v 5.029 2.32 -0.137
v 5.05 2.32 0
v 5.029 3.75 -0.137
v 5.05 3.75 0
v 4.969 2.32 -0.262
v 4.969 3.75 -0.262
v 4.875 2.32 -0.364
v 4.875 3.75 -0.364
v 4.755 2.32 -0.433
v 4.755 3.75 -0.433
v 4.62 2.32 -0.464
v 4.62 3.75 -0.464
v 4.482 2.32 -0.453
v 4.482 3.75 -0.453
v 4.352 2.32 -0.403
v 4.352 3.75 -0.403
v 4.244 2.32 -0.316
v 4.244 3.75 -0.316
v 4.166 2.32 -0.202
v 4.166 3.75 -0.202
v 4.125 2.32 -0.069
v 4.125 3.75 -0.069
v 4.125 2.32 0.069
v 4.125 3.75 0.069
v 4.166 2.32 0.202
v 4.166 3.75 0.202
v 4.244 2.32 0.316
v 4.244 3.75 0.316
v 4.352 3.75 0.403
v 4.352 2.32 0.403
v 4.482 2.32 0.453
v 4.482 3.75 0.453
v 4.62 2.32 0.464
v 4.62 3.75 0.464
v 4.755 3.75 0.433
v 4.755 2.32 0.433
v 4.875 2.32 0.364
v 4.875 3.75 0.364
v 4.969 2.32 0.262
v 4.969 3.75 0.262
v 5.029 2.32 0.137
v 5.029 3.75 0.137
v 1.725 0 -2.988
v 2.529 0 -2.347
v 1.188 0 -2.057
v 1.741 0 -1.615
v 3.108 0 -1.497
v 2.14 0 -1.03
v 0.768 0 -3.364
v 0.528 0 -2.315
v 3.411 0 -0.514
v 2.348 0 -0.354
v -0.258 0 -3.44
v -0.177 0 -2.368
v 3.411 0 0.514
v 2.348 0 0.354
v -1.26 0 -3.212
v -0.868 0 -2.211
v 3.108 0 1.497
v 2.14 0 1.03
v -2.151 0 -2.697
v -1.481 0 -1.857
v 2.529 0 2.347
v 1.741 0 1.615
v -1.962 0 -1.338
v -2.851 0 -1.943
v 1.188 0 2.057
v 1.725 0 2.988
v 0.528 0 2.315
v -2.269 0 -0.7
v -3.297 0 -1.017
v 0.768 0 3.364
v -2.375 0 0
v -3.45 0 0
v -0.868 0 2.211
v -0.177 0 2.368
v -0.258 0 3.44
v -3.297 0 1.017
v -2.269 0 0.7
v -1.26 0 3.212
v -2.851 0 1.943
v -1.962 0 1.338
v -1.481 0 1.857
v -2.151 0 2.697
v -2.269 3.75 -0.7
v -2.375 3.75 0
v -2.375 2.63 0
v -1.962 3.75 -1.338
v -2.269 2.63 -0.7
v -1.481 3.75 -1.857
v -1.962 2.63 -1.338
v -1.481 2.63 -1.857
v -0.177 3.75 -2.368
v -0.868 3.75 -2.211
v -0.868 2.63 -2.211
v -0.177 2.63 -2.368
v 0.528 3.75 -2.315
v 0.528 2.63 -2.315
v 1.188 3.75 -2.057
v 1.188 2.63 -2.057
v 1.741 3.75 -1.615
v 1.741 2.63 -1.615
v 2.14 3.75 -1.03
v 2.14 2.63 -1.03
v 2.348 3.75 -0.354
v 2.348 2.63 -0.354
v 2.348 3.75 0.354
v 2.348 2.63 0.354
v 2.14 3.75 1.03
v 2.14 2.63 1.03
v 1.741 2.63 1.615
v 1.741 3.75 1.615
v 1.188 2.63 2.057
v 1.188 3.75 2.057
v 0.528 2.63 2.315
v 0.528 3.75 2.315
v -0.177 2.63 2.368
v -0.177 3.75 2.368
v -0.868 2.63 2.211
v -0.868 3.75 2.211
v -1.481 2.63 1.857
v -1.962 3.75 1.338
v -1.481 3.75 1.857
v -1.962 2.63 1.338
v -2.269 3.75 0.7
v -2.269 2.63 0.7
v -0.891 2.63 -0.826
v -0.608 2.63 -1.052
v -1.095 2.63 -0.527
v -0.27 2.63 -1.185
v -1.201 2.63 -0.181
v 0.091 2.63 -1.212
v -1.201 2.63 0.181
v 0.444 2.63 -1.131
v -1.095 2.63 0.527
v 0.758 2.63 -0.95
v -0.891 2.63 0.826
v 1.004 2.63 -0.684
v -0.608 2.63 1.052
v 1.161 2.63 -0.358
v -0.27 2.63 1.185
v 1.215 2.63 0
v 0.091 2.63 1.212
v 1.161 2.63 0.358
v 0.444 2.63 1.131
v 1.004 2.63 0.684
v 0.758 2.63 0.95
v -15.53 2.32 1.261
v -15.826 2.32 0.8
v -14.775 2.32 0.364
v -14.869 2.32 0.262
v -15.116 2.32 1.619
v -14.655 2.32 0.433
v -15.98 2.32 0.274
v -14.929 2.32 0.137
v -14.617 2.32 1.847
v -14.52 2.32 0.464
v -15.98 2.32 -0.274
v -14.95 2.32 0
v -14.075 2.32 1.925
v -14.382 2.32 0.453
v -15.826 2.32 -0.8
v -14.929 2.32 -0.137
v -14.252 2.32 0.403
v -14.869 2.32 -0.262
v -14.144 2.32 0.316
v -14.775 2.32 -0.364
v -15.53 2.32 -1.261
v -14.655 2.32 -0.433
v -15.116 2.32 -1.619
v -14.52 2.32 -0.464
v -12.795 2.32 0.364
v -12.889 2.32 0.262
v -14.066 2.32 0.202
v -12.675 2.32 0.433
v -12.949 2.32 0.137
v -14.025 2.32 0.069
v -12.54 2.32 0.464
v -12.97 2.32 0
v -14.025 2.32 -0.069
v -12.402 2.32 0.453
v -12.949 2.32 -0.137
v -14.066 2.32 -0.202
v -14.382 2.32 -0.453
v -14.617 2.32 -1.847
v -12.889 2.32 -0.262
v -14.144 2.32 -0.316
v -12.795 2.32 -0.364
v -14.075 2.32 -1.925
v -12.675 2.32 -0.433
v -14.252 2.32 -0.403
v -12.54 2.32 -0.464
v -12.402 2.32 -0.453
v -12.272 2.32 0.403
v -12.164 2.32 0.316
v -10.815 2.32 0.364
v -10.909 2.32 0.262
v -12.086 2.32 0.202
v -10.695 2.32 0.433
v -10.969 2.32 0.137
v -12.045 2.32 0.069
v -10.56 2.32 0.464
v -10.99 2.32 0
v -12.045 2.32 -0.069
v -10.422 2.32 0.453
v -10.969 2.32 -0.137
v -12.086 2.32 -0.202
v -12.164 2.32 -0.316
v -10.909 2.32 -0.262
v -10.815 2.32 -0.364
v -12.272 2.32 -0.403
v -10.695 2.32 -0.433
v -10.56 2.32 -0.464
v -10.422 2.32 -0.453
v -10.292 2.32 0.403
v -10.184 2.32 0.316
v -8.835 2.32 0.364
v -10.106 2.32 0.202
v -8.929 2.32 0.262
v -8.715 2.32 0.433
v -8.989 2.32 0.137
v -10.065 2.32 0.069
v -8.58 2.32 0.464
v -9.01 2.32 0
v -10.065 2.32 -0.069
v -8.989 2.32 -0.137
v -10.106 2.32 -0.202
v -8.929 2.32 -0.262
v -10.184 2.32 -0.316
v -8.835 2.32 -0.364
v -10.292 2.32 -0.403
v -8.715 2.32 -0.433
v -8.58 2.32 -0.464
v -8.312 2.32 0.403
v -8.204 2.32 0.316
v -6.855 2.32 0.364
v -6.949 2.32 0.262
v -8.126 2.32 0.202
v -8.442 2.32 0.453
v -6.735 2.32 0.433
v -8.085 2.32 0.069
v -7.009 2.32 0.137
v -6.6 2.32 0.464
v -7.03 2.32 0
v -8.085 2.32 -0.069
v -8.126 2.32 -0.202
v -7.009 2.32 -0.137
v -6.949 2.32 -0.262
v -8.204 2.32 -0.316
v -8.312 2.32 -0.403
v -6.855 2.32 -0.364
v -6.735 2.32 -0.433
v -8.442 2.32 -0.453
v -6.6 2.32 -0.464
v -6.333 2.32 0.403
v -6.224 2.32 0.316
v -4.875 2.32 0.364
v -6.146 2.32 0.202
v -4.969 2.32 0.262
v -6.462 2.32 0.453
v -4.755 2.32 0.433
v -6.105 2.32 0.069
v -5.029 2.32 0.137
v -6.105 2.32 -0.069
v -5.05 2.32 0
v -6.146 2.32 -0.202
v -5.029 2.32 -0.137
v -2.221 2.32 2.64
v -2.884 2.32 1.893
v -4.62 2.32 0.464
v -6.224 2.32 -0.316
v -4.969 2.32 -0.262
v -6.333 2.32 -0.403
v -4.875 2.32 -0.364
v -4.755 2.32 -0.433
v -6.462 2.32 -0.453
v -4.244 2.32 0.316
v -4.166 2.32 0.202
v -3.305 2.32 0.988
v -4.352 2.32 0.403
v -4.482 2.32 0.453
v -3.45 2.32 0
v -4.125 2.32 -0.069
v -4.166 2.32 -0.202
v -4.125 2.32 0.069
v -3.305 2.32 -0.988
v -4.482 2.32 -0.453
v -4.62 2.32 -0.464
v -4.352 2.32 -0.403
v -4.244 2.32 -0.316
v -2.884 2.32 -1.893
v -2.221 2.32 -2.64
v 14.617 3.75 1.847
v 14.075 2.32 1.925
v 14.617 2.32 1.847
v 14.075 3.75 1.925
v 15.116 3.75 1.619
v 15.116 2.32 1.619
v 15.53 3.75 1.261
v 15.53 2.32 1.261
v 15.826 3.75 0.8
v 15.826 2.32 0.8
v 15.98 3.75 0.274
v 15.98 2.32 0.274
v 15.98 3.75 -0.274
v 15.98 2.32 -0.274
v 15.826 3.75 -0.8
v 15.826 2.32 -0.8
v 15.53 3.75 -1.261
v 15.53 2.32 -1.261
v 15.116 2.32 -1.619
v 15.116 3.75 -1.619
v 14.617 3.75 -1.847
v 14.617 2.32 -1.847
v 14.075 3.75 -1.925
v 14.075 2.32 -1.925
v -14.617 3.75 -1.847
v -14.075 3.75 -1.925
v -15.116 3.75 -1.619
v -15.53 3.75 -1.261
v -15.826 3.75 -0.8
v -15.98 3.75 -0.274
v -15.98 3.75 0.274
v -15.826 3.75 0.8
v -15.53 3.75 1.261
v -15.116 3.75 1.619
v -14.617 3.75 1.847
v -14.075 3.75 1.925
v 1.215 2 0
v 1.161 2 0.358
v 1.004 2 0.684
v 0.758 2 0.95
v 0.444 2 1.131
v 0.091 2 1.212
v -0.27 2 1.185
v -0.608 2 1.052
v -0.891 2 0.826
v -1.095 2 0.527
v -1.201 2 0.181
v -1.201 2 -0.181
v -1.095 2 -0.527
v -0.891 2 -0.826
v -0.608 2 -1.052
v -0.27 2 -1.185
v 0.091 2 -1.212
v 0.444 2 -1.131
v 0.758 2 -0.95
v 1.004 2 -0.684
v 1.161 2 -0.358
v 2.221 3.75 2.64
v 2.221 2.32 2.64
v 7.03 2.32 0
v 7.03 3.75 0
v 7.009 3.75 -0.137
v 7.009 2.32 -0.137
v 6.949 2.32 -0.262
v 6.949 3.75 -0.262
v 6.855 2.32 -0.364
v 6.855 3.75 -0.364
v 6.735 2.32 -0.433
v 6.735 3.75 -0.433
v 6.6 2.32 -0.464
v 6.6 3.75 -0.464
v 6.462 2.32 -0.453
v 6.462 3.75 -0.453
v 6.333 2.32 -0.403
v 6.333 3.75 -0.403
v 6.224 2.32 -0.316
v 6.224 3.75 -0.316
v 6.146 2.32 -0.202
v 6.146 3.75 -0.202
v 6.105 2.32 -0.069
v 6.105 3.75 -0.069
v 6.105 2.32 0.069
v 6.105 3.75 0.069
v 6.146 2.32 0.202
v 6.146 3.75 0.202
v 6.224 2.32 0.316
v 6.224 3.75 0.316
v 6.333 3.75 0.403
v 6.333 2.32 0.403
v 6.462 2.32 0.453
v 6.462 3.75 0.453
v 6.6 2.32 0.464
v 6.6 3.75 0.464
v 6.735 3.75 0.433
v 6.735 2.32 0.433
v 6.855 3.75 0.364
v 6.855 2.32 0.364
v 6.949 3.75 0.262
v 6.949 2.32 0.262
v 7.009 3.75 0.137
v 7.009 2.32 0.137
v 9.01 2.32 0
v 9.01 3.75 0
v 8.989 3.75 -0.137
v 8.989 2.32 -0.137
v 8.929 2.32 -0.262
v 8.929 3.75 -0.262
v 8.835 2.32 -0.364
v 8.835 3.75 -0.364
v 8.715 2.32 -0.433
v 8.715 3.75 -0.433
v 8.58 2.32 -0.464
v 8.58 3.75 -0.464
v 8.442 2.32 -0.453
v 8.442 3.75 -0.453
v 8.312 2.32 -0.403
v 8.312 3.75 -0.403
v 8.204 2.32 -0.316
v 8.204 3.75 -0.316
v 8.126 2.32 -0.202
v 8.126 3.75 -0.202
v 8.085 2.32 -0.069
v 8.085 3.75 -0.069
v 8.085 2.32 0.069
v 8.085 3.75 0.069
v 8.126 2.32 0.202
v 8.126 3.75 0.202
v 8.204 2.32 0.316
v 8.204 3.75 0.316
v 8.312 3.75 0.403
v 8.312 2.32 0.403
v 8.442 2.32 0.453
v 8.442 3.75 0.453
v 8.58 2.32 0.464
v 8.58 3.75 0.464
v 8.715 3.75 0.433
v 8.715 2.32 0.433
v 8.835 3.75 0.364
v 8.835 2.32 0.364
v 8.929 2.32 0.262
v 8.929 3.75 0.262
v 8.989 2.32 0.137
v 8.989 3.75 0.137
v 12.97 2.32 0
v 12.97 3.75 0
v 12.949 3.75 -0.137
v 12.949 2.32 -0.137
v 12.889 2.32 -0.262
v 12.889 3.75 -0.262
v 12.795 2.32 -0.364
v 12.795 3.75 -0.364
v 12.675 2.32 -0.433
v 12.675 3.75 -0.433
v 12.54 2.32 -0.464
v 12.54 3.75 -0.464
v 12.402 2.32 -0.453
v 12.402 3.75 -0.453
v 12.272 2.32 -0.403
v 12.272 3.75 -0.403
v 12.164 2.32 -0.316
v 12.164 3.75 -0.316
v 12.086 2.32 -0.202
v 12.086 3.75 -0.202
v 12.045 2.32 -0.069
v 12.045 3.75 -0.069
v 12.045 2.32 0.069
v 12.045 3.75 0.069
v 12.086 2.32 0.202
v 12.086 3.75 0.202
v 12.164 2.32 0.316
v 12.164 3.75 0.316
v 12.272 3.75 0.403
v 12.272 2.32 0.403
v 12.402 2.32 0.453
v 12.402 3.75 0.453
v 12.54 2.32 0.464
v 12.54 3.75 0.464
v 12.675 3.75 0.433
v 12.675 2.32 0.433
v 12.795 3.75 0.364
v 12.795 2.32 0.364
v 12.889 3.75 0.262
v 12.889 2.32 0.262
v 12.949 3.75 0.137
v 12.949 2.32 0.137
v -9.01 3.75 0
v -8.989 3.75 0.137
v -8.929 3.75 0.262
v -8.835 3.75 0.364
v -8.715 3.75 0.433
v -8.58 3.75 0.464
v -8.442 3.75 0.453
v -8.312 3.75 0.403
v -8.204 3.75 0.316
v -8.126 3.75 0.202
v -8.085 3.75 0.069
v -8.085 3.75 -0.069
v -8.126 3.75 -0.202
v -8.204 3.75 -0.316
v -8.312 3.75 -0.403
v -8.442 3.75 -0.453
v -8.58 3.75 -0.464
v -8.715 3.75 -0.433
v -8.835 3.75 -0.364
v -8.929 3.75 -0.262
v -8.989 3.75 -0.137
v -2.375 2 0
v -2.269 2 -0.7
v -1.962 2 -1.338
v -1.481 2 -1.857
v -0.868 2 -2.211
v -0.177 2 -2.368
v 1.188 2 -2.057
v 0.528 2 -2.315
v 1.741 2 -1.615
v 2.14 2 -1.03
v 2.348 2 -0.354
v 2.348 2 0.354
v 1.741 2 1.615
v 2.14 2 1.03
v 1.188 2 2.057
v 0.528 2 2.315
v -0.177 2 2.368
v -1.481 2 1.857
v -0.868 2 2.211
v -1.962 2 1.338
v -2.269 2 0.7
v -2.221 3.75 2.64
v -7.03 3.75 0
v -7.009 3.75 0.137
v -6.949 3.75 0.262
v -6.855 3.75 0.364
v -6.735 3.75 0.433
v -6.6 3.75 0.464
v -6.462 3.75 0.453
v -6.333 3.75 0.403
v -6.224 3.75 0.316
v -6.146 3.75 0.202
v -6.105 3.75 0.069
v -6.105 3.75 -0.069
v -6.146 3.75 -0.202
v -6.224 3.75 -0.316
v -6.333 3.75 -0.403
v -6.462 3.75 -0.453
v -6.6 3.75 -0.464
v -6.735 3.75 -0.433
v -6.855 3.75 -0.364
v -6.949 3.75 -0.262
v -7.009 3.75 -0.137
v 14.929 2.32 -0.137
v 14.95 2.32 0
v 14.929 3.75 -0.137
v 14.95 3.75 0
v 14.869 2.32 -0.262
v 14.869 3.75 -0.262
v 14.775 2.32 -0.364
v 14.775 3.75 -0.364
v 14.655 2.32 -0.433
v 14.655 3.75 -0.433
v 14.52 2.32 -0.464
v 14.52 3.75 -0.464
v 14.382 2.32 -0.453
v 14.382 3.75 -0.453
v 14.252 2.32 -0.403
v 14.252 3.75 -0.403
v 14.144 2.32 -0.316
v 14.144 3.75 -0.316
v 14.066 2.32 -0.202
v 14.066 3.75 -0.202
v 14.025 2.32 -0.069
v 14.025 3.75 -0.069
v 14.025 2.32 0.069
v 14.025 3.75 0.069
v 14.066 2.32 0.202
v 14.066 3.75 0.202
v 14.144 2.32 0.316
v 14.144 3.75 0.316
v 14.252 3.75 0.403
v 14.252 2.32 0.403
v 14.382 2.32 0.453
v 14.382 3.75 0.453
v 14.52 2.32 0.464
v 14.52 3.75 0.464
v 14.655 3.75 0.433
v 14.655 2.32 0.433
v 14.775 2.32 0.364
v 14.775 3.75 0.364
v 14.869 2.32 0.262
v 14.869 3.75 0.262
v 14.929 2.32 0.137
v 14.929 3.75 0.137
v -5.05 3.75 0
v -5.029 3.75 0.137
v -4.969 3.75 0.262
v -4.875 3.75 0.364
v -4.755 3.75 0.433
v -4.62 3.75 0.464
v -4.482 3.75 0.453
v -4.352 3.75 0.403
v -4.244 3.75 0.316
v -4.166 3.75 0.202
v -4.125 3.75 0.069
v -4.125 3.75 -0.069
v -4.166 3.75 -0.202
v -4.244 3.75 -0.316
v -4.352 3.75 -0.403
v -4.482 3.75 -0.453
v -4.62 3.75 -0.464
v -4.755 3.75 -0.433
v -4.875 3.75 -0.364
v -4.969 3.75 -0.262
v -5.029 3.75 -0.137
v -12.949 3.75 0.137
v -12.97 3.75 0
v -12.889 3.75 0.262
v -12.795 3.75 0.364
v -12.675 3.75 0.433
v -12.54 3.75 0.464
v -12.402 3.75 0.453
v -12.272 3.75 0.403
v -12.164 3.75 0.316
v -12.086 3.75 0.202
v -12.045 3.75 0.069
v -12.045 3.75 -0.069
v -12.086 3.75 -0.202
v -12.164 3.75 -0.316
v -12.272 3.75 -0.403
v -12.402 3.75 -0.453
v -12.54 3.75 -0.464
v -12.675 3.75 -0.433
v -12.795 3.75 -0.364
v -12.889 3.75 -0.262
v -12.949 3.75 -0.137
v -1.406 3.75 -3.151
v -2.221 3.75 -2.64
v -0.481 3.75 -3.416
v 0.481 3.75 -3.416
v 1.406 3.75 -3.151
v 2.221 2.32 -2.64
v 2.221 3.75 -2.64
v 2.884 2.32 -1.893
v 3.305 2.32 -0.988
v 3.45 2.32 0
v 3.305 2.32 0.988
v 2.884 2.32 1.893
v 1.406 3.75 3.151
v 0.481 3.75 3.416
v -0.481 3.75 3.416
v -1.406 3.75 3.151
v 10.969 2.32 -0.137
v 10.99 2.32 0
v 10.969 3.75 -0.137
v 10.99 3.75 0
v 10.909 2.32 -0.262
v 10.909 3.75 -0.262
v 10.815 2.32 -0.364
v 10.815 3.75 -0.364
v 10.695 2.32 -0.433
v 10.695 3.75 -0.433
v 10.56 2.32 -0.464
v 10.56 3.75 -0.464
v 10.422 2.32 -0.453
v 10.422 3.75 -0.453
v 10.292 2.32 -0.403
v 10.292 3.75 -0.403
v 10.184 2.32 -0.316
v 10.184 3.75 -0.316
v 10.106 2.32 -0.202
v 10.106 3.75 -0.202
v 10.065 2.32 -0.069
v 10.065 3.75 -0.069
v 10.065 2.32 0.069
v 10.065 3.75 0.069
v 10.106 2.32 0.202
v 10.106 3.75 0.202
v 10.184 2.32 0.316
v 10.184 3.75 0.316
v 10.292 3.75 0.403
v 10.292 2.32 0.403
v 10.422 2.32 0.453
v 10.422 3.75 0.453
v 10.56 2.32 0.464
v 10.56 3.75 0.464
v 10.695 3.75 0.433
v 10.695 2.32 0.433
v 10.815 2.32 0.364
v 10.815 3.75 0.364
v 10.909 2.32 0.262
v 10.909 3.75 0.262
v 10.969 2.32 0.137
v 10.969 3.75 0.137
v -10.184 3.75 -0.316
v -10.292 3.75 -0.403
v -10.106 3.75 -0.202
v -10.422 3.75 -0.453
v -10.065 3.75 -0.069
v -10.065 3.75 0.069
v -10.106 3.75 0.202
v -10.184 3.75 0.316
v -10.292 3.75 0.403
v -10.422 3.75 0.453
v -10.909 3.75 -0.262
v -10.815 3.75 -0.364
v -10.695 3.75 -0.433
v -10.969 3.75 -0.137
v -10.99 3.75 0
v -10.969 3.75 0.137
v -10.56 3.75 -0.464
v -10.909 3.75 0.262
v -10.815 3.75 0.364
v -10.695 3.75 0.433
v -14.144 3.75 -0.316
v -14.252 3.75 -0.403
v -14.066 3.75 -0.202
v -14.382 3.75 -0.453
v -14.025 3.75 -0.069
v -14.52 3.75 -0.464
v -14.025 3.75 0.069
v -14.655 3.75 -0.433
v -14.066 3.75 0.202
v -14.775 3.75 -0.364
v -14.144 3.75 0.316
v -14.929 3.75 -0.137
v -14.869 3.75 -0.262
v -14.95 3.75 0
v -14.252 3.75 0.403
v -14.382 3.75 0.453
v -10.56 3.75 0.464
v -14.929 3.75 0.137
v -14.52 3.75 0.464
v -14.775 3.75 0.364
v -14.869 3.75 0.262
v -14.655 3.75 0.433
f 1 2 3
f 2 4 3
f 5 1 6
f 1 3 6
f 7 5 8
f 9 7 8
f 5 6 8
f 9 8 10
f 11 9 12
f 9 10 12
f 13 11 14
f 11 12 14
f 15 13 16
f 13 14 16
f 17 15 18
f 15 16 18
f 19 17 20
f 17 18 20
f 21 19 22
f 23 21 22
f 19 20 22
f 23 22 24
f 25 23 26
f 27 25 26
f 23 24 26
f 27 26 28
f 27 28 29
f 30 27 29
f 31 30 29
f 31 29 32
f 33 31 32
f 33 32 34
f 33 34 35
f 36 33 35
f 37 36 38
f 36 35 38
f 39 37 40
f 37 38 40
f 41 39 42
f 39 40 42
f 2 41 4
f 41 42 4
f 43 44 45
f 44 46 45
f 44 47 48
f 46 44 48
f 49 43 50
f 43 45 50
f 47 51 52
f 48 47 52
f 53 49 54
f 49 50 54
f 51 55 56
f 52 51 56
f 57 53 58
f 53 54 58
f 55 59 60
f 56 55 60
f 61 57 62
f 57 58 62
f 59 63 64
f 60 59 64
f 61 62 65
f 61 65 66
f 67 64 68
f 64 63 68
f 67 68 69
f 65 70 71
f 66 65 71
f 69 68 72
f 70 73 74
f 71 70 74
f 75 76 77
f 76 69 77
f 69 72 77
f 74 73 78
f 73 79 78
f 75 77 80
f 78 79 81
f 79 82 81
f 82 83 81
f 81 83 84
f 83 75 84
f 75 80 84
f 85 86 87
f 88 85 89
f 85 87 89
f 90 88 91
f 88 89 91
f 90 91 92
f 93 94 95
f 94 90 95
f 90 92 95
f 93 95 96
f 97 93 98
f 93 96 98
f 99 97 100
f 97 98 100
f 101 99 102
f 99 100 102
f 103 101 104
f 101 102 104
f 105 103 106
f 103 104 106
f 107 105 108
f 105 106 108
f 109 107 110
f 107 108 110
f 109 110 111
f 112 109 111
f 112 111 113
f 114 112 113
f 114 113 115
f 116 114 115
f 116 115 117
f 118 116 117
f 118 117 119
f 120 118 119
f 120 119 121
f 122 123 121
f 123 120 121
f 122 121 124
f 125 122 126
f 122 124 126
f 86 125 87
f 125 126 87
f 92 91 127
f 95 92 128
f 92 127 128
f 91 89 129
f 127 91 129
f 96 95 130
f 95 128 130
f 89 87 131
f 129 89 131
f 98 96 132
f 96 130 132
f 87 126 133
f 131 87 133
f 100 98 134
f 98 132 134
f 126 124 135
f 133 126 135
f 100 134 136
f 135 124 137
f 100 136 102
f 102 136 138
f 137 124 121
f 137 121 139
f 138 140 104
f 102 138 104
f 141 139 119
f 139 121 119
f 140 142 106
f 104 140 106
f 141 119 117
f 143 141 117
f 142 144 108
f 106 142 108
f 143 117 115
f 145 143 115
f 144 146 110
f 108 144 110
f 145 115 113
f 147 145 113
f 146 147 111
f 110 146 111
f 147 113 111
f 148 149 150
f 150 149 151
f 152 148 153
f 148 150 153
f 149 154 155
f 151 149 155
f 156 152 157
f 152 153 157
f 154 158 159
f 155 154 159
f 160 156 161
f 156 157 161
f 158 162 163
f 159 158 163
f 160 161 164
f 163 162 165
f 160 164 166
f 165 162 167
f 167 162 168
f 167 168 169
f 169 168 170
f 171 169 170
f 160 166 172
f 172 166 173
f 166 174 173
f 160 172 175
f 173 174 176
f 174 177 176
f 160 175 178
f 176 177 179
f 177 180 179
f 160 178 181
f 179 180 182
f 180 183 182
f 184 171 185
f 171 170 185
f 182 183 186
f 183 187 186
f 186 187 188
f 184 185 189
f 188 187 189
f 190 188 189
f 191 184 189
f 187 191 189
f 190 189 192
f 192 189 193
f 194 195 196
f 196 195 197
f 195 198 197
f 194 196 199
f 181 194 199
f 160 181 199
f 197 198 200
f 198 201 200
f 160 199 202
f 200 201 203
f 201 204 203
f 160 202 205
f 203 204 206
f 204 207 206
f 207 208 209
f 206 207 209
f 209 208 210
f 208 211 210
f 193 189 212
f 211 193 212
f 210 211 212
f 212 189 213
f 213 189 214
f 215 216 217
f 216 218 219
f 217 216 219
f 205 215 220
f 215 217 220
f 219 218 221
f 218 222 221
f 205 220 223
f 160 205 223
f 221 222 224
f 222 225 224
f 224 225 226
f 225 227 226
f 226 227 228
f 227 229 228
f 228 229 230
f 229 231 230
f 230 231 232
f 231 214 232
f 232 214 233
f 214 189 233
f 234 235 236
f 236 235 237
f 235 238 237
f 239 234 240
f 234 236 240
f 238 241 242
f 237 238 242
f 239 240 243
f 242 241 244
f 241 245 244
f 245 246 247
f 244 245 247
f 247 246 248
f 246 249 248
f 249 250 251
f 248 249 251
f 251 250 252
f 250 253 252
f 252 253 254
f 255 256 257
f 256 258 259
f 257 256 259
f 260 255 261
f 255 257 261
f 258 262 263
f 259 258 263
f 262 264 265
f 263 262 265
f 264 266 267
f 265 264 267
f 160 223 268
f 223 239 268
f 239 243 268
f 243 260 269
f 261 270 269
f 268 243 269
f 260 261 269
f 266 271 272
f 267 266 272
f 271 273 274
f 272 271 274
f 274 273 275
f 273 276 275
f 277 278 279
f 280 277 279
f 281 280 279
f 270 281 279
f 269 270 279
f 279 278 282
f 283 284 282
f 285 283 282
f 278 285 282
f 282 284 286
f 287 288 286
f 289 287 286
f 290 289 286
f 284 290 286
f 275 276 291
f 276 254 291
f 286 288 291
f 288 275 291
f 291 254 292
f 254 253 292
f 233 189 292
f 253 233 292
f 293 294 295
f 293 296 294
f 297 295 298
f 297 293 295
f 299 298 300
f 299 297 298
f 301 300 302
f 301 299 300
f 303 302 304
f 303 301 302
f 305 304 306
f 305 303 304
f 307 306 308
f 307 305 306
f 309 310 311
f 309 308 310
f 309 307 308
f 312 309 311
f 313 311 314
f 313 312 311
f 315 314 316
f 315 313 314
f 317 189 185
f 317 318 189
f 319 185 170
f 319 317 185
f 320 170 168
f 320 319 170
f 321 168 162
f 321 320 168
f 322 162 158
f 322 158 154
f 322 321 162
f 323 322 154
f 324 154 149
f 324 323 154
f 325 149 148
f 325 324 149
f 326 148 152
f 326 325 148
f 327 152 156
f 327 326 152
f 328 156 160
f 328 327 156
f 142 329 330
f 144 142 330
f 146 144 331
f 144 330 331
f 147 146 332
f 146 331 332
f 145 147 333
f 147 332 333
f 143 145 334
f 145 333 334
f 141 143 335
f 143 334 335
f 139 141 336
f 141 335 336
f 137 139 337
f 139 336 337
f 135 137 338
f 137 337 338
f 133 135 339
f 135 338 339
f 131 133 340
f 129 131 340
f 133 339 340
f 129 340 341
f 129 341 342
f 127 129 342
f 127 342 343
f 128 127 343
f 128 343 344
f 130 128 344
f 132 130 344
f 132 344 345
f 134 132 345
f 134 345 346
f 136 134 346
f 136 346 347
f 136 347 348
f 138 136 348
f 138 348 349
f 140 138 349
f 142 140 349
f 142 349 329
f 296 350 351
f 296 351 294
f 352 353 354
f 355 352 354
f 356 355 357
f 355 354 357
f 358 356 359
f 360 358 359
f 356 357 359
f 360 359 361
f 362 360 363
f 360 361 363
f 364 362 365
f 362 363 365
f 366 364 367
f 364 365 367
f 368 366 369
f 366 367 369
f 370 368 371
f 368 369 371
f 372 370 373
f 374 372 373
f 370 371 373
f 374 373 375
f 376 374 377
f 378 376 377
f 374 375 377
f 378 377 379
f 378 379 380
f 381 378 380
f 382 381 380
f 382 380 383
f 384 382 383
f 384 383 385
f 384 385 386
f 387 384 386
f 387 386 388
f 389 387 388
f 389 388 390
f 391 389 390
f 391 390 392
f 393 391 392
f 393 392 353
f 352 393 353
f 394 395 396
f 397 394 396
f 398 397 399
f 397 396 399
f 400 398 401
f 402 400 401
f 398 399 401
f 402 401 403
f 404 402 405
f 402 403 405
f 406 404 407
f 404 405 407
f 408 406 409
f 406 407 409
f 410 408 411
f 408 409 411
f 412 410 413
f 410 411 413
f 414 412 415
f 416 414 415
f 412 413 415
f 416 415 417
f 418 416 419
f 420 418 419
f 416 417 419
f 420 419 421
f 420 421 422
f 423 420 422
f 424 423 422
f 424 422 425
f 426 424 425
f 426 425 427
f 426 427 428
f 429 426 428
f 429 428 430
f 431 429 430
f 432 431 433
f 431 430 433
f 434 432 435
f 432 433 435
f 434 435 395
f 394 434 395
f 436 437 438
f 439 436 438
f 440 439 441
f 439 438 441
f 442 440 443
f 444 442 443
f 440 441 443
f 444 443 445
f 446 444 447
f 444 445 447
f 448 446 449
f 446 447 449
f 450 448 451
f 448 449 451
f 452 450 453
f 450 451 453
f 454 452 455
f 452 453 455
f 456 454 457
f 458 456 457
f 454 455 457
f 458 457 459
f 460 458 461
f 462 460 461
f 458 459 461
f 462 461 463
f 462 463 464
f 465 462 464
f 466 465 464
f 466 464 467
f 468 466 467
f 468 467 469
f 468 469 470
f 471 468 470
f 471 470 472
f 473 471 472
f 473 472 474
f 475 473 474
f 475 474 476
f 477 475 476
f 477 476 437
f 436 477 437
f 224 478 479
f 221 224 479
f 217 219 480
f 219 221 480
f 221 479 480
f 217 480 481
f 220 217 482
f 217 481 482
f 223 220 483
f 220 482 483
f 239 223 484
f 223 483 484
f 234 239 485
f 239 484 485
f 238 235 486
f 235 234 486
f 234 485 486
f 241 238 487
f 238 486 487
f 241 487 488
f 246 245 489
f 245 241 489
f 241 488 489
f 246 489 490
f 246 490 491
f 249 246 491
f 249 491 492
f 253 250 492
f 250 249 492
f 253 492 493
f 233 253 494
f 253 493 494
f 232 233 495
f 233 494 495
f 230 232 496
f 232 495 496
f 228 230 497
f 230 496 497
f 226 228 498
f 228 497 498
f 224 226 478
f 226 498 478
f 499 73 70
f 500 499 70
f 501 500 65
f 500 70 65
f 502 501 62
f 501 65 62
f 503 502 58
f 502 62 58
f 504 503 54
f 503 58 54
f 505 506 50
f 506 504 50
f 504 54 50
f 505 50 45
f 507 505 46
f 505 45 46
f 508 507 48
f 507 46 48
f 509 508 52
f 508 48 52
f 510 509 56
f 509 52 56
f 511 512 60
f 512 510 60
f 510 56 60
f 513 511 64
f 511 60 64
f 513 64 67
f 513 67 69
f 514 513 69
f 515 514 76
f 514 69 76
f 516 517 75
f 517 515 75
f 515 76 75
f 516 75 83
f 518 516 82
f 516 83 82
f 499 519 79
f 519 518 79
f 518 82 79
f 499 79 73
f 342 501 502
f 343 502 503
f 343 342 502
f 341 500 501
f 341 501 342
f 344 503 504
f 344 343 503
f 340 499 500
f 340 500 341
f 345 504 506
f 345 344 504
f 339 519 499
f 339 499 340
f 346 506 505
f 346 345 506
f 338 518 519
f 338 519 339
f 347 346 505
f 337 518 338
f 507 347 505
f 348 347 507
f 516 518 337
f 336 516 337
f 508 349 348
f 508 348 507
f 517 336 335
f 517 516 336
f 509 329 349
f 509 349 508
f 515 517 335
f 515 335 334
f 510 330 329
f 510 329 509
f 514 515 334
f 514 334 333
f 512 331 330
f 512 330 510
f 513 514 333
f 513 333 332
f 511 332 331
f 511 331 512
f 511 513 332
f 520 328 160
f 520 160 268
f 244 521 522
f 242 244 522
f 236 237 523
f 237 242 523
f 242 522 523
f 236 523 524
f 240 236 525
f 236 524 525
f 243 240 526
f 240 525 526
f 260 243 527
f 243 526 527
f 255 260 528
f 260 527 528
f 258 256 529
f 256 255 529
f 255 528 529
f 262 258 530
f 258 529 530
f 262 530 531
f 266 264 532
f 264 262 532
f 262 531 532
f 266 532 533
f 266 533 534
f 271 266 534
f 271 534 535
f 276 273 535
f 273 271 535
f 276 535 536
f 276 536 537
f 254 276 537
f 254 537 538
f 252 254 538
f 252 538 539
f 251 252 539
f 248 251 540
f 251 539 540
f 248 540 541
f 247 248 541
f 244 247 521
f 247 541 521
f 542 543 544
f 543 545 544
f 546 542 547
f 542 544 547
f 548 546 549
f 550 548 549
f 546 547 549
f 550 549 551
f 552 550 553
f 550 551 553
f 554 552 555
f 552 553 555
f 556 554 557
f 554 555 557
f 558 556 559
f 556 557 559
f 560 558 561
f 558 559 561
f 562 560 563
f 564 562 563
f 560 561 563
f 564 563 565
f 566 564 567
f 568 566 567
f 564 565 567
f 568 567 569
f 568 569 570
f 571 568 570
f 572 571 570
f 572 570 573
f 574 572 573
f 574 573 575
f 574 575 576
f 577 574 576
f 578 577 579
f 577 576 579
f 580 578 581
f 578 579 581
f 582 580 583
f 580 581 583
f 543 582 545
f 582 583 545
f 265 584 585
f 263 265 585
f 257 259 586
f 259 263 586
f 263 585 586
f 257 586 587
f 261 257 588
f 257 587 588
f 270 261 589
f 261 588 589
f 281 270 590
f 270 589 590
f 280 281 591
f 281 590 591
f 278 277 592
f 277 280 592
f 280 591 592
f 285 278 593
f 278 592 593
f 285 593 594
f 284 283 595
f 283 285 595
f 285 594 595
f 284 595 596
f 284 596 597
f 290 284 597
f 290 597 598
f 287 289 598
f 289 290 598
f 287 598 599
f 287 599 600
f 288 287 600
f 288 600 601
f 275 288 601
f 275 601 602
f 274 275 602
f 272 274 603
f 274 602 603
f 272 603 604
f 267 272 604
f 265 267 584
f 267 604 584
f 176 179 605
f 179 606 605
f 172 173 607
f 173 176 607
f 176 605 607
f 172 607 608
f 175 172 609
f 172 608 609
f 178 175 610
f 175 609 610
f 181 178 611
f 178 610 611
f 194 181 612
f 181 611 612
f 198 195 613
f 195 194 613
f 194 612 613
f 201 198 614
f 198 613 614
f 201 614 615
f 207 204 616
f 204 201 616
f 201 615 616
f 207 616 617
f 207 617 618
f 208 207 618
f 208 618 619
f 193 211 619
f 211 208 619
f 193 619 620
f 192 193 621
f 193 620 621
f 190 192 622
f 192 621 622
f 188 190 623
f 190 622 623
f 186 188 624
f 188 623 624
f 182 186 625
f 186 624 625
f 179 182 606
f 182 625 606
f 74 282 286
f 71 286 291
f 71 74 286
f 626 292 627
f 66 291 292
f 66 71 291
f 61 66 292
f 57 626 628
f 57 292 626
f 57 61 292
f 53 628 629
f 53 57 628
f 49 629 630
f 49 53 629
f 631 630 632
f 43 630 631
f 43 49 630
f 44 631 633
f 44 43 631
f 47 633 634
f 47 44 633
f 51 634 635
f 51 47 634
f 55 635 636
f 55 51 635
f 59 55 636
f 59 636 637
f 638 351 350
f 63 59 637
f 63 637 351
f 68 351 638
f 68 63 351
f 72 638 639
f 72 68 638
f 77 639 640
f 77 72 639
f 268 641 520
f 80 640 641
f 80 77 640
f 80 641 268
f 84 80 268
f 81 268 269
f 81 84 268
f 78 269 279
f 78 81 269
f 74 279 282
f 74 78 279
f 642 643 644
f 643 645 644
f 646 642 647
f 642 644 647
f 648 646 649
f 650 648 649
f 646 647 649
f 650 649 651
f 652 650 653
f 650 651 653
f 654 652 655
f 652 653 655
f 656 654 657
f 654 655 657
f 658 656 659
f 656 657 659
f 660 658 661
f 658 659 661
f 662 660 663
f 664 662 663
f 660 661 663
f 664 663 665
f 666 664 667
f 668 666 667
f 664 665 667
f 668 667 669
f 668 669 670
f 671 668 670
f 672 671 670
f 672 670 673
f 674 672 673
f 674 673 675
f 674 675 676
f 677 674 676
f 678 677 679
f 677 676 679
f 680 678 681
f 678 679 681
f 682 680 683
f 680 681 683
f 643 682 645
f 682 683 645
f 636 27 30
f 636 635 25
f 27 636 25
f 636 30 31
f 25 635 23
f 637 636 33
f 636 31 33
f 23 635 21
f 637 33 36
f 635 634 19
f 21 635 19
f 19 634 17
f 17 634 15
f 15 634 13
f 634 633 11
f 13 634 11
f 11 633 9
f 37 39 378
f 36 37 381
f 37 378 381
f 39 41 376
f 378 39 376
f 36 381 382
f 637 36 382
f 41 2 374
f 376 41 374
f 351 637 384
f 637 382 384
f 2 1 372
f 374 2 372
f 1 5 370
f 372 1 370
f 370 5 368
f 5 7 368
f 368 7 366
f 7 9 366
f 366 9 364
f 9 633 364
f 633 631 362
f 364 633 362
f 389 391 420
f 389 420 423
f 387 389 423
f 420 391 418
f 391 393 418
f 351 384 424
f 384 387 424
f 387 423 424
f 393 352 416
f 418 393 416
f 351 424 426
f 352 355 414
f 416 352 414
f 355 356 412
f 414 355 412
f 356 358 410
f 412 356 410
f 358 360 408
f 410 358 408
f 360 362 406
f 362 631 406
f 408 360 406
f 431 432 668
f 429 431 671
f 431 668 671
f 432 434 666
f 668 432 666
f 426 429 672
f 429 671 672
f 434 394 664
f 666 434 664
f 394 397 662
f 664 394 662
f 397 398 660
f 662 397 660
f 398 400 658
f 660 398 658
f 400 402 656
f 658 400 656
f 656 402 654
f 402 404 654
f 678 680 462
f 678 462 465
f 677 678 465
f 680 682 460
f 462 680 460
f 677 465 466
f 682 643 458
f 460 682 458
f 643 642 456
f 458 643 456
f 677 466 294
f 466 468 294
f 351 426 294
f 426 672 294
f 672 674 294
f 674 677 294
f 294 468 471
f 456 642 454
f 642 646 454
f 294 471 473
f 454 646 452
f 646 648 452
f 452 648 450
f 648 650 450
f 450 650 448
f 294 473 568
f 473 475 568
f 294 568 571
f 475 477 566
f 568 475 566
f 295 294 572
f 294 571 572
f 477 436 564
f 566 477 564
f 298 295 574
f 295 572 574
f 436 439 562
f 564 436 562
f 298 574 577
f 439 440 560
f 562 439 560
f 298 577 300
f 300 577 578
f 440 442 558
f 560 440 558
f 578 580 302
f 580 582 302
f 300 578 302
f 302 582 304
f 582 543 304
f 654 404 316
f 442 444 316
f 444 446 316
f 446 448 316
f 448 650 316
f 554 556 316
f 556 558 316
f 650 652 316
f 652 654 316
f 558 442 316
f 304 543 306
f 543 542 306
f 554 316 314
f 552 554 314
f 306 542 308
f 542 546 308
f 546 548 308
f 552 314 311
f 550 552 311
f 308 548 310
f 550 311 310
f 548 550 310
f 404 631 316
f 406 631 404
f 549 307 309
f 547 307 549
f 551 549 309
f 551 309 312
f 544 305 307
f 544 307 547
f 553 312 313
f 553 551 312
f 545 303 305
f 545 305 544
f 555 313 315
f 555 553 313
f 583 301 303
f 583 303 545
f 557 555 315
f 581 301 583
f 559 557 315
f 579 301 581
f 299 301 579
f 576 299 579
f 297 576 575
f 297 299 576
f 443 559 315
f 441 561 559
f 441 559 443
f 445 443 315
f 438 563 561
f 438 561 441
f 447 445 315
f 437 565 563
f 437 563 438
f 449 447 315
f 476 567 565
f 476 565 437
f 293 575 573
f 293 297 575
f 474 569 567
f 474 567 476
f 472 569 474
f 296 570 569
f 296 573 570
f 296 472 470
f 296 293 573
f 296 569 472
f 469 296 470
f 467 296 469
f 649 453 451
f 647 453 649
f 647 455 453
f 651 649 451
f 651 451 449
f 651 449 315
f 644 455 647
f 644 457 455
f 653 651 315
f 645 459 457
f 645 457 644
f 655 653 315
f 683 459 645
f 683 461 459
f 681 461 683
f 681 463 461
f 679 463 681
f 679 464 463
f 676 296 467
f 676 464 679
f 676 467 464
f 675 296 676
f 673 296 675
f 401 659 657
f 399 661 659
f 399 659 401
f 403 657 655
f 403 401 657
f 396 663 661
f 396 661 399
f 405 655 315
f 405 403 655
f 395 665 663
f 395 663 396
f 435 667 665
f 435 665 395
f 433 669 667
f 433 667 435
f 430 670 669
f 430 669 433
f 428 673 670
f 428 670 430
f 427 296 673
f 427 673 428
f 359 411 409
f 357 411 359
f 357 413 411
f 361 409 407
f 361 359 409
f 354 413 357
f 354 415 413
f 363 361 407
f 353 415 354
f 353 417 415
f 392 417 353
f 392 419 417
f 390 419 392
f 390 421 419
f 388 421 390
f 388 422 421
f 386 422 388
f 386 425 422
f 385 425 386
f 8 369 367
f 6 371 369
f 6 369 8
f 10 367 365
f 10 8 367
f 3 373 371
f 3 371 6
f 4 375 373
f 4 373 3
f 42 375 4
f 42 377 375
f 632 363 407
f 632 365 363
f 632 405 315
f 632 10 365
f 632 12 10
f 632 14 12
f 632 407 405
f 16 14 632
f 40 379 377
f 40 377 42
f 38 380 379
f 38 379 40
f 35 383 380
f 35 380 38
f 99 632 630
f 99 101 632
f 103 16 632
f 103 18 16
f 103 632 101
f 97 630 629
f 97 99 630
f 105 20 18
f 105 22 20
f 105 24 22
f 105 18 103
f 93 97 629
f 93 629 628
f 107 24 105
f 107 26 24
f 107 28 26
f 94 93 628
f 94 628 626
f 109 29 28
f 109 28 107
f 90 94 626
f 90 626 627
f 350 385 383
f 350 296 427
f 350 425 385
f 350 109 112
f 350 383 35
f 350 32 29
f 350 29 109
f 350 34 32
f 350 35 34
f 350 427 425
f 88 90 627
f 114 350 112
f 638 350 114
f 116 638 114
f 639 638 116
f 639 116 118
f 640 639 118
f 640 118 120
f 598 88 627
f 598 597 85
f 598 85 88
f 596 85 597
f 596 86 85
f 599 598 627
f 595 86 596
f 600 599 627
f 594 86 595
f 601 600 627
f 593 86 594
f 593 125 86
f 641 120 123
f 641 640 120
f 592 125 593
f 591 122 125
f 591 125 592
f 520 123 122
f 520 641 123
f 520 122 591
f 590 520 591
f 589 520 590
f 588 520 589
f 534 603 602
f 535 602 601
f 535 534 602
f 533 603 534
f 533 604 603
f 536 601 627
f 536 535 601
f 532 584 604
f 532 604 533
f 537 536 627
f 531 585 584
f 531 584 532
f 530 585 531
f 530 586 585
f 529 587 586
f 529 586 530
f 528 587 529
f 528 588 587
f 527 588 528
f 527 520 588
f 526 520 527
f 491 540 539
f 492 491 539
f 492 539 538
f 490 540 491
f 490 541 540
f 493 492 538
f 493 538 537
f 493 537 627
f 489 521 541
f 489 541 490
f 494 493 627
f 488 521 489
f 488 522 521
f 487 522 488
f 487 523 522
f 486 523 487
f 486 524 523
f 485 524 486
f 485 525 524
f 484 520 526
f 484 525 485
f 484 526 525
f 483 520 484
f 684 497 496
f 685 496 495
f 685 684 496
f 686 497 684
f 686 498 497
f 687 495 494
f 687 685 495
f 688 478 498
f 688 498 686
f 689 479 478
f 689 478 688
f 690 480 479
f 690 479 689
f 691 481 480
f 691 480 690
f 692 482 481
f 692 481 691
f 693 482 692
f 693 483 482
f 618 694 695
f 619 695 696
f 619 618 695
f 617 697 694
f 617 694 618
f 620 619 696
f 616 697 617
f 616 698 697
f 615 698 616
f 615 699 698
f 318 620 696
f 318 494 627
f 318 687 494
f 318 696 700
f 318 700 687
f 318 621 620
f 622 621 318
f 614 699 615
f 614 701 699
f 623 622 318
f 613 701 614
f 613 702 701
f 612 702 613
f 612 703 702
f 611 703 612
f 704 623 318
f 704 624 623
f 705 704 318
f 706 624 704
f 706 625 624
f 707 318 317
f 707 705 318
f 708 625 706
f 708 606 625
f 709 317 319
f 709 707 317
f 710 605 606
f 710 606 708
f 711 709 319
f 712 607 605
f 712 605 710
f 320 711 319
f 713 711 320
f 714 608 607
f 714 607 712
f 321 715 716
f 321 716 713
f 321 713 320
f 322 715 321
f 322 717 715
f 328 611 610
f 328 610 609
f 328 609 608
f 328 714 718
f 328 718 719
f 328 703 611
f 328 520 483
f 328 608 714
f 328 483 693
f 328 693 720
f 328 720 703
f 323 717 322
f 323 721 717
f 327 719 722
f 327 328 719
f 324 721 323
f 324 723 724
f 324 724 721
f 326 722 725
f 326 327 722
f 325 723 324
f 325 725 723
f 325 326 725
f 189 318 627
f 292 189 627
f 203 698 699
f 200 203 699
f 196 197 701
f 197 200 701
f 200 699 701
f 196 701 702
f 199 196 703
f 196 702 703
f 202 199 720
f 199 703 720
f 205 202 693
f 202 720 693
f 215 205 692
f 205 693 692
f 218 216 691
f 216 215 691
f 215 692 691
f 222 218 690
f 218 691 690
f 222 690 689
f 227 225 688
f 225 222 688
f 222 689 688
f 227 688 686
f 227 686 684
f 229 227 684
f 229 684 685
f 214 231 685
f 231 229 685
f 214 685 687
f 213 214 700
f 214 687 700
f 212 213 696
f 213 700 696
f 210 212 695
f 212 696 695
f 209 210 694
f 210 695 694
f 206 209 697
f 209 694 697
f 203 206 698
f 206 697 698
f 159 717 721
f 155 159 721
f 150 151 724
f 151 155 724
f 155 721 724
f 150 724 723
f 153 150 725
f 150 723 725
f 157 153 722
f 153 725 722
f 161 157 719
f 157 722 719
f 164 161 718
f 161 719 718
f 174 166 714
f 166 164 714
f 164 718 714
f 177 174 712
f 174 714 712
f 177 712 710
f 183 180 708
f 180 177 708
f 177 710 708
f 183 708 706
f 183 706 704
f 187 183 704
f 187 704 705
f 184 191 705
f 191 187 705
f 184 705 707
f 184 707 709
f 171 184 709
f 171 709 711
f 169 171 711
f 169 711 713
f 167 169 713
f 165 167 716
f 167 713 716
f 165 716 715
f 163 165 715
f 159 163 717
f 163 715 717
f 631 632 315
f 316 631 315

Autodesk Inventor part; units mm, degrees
ref_plane "YZ Plane" through (0, 0, 0) normal (1, 0, 0) x (0, 1, 0)
ref_plane "XZ Plane" through (0, 0, 0) normal (0, 1, 0) x (-1, 0, 0)
sketch "Sketch1" plane through (0, 0, 0) normal (0, 1, 0) x (-1, 0, 0)
  circle A0 centre (0, 0) radius 2.375
  circle A1 centre (0, 0) radius 3.45
  dimension "d0" = 4.75
  dimension "d1" = 6.9
extrude "Extrusion1" add sketch "Sketch1" along normal blind 3.75
ref_plane "2mm deep in well" through (0, 2, 0) normal (0, -1, 0) x (1, 0, 0)
sketch "Sketch2" plane through (0, 2, 0) normal (0, -1, 0) x (1, 0, 0)
  point P0 (0, 0)
sketch "Sketch3" plane through (0, 2, 0) normal (0, -1, 0) x (1, 0, 0)
  circle A0 centre (0, 0) radius 3.45 projected
  circle A1 centre (0, 0) radius 2.375 projected
  circle A2 centre (0, 0) radius 1.215
  dimension "d5" = 2.43
extrude "Extrusion2" add sketch "Sketch3" against normal blind 0.63 contours A1
sketch "Sketch4" plane through (0, 3.75, 0) normal (0, 1, 0) x (1, 0, 0)
  line L0 (-16, 0) -> (16, 0)
  circle A0 centre (14.075, 0) radius 1.925
  circle A1 centre (0, 0) radius 3.45 projected
  circle A2 centre (0, 0) radius 2.375 projected
  line L1 (2.221, 2.64) -> (2.221, -2.64)
  line L2 (2.221, 2.64) -> (14.075, 1.925)
  line L3 (2.221, -2.64) -> (14.075, -1.925)
  dimension "d8" = 32
  dimension "d9" = 0
  dimension "d10" = 0
  dimension "d11" = 3.85
  dimension "d12" = 1.925
  dimension "d13" = 0
  dimension "d14" = 5.28
extrude "Extrusion3" add sketch "Sketch4" against normal blind 1.43 contours A1 L2 A0 L0 | L0 A0 L3 A1 | A0 L0 | L0 A0
sketch "Sketch5" plane through (0, 3.75, 0) normal (0, 1, 0) x (1, 0, 0)
  circle A0 centre (14.485, 0) radius 0.465
  arc A1 (2.221, 2.64) -> (2.221, -2.64) centre (0, 0) ccw projected
  line L0 (2.221, -2.64) -> (14.075, -1.925) projected
  arc A2 (14.075, -1.925) -> (14.075, 1.925) centre (14.075, 0) ccw projected
  line L1 (14.075, 1.925) -> (2.221, 2.64) projected
  circle A3 centre (0, 0) radius 2.375 projected
  point P0 (16, 0)
  dimension "d17" = 0.93
  dimension "d18" = 0
  dimension "d19" = 1.515
extrude "Extrusion4" cut sketch "Sketch5" against normal up to surface (1.43 mm away) contours A0
pattern_linear "Rectangular Pattern1" count 6 spacing 1.98 along (-1, 0, 0) of "Extrusion4"
mirror "Mirror1" about plane through (0, 0, 0) normal (1, 0, 0) of "Extrusion3", "Extrusion4", "Rectangular Pattern1"
properties part number "Servo Horn"
